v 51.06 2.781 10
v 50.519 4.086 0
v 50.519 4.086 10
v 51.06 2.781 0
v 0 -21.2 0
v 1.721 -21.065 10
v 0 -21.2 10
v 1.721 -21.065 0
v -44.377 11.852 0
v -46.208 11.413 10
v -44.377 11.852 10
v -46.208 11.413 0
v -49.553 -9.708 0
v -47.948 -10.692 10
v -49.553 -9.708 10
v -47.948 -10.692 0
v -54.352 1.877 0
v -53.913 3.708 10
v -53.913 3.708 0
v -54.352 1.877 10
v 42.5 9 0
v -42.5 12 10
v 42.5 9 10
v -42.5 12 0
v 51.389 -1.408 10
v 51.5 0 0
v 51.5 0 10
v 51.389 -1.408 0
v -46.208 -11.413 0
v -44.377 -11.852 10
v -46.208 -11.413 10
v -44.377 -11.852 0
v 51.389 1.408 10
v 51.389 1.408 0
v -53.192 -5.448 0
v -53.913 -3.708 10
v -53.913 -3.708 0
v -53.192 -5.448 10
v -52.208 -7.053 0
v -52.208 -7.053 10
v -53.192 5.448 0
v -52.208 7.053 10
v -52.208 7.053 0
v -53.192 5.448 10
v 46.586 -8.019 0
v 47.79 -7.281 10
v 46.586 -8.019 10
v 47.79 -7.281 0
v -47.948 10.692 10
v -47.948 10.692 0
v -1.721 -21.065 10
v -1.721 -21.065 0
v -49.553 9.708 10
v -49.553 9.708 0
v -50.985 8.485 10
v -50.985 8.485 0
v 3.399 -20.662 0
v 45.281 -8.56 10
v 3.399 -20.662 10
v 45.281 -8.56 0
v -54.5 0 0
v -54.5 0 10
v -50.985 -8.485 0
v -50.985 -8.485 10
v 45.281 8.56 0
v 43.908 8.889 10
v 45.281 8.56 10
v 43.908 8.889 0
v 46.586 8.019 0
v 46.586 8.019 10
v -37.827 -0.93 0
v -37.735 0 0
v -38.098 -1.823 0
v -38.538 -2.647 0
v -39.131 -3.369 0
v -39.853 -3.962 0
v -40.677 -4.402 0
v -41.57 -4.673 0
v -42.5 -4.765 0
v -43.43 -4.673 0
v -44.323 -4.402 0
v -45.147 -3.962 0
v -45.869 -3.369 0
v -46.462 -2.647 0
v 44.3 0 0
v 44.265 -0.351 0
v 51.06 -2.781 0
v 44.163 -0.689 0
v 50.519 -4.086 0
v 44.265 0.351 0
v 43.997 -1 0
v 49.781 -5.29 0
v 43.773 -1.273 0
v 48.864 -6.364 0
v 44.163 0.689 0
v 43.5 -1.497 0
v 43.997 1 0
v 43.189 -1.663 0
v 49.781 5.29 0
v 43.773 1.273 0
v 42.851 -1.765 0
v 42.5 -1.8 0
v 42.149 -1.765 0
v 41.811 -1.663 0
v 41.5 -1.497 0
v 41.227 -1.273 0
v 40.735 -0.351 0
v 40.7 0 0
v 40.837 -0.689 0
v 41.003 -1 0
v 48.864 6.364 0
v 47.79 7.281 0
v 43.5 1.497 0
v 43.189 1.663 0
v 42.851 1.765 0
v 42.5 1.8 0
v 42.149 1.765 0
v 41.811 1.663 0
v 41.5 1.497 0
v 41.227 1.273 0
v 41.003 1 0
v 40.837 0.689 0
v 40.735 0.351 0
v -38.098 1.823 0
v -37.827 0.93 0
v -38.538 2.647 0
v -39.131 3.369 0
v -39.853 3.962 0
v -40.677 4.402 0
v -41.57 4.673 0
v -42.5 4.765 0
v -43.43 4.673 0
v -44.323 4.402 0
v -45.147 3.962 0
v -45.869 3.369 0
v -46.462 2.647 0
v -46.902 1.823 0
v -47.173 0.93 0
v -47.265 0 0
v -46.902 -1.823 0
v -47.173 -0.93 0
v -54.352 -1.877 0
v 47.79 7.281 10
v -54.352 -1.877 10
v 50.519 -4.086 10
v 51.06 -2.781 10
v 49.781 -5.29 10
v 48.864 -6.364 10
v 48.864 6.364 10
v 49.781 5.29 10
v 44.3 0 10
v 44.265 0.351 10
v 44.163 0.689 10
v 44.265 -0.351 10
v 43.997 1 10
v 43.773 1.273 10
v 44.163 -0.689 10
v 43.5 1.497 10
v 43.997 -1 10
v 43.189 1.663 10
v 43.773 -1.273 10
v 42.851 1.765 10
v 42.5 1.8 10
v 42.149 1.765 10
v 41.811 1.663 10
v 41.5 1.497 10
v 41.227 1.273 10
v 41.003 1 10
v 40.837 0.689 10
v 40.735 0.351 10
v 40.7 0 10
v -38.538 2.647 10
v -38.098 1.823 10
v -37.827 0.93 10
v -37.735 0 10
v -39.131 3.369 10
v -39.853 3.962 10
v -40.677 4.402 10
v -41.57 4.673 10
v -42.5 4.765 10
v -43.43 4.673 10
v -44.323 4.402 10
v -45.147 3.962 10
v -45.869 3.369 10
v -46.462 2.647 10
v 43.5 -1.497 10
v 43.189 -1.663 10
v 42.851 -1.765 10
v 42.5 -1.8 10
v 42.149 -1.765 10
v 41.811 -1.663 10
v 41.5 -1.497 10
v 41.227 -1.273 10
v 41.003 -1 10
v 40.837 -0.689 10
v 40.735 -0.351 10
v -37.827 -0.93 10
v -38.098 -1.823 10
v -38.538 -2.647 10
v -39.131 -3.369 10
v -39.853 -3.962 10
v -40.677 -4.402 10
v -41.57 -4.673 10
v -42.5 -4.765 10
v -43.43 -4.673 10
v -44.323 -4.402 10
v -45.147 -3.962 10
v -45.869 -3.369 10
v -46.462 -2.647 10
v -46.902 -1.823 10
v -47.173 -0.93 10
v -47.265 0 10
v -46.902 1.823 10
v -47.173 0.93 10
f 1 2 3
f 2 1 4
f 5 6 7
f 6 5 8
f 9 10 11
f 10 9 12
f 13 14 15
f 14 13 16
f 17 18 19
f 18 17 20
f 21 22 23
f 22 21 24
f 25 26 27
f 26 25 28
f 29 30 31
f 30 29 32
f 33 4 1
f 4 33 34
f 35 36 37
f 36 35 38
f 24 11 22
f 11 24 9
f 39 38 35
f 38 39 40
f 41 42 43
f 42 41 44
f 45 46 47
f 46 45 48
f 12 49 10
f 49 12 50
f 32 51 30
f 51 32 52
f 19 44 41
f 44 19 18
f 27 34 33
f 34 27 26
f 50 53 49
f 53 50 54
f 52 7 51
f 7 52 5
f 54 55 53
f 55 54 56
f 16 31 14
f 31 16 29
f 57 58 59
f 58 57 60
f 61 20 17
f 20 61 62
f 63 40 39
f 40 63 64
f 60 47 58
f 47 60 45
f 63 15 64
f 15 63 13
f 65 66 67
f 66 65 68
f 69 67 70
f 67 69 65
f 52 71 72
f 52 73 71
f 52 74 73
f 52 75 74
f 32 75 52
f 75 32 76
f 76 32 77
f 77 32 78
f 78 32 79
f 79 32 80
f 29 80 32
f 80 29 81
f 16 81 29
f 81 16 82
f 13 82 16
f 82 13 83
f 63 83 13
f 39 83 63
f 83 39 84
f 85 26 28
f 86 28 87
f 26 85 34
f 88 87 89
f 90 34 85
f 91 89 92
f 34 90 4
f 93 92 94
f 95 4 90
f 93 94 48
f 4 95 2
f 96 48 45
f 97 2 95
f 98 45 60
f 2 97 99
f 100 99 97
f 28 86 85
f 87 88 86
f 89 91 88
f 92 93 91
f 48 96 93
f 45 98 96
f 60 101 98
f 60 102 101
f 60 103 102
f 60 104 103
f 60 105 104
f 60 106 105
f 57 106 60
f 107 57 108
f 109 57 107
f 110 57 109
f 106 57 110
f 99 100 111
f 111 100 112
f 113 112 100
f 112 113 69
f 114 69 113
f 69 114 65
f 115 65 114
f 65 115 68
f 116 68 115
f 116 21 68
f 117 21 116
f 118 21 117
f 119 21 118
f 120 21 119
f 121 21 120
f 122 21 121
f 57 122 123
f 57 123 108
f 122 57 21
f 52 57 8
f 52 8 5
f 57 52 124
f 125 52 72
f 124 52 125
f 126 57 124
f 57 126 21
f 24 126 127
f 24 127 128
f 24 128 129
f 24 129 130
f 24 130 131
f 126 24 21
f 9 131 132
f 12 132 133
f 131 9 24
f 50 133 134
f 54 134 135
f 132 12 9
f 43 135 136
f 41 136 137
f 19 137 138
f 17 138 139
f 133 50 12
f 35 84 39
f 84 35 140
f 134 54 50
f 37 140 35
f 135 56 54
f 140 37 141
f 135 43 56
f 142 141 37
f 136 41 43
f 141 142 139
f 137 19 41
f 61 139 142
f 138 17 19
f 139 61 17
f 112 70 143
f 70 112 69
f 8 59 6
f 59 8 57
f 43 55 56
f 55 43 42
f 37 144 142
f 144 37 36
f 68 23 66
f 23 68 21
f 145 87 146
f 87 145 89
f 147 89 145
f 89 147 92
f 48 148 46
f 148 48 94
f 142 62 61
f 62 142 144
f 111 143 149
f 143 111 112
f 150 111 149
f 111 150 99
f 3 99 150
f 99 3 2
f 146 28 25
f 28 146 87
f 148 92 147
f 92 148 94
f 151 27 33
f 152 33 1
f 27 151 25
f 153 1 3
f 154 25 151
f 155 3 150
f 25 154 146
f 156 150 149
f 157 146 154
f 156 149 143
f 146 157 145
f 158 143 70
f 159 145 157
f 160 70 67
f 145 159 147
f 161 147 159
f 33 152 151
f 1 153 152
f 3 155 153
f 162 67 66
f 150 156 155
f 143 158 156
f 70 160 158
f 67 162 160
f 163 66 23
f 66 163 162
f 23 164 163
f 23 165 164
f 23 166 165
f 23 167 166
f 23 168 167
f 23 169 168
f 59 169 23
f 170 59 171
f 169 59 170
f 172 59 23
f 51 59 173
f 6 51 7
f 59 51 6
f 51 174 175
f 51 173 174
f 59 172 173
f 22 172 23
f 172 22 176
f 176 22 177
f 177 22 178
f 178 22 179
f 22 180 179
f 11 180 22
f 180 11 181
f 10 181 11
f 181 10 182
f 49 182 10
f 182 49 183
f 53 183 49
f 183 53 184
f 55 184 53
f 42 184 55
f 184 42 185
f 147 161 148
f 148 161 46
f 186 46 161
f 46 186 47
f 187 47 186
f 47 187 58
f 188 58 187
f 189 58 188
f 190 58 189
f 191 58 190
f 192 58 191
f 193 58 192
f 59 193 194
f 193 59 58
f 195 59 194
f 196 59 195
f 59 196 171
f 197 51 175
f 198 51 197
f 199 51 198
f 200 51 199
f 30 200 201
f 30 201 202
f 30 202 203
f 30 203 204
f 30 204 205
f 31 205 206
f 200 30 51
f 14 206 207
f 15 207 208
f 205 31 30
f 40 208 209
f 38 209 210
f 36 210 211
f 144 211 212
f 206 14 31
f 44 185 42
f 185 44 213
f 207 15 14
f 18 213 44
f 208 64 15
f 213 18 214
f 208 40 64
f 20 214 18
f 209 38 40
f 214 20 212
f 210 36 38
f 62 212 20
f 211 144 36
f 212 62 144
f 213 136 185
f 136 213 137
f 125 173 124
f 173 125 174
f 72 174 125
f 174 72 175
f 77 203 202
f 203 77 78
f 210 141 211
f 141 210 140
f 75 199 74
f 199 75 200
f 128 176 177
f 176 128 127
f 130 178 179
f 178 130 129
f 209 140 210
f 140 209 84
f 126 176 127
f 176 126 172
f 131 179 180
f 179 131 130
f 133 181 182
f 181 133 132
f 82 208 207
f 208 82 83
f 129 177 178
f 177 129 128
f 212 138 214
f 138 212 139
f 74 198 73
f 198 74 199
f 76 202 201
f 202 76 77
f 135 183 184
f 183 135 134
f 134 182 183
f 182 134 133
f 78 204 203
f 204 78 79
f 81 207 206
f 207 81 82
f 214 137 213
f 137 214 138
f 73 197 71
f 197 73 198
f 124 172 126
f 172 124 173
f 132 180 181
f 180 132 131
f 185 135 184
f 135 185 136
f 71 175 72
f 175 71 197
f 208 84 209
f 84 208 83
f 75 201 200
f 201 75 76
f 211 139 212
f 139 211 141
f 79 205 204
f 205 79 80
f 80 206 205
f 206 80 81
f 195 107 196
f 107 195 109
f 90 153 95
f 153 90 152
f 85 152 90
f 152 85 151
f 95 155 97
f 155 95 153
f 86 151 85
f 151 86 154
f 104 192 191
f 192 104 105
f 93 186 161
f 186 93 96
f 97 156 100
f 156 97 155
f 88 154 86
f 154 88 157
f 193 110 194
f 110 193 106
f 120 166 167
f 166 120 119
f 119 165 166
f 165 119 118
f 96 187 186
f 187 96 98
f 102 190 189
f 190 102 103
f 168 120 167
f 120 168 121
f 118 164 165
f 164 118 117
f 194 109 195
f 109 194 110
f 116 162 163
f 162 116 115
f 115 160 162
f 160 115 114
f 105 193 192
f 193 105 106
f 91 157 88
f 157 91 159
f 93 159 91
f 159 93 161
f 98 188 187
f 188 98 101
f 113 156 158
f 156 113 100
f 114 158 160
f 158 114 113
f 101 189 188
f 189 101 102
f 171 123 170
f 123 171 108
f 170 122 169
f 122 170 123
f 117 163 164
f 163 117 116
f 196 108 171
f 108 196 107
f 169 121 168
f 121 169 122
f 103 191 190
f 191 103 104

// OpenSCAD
$fn = 32;

// ----------------------------------------------------------------------
// Lever: 85 mm between the bosses, 10 mm thick, smooth outline
// ----------------------------------------------------------------------

// --- parameters (mm) ---
lever_l = 85;             // distance between the boss centres
boss_a = 24;              // first boss diameter
boss_b = 18;              // second boss diameter
bore_a = 9.53;            // first bore
bore_b = 3.6;             // second bore
lever_t = 10;             // lever thickness
boss_c = 22;              // middle boss diameter
bend = 10.2;              // how far the middle boss drops

lever_profile = [[-54.5, 0], [-54.352, -1.877], [-53.913, -3.708], [-53.192, -5.448], [-52.208, -7.053], [-50.985, -8.485], [-49.553, -9.708], [-47.948, -10.692], [-46.208, -11.413], [-44.377, -11.852], [-1.721, -21.065], [0, -21.2], [1.721, -21.065], [3.399, -20.662], [45.281, -8.56], [46.586, -8.019], [47.79, -7.281], [48.864, -6.364], [49.781, -5.29], [50.519, -4.086], [51.06, -2.781], [51.389, -1.408], [51.5, 0], [51.389, 1.408], [51.06, 2.781], [50.519, 4.086], [49.781, 5.29], [48.864, 6.364], [47.79, 7.281], [46.586, 8.019], [45.281, 8.56], [43.908, 8.889], [42.5, 9], [-42.5, 12], [-44.377, 11.852], [-46.208, 11.413], [-47.948, 10.692], [-49.553, 9.708], [-50.985, 8.485], [-52.208, 7.053], [-53.192, 5.448], [-53.913, 3.708], [-54.352, 1.877]];

difference() {
  linear_extrude(height = lever_t) polygon(lever_profile);
  translate([-42.5, 0, -2.5]) cylinder(h = lever_t + 5, d = bore_a);
  translate([42.5, 0, -2.5]) cylinder(h = lever_t + 5, d = bore_b);
}
